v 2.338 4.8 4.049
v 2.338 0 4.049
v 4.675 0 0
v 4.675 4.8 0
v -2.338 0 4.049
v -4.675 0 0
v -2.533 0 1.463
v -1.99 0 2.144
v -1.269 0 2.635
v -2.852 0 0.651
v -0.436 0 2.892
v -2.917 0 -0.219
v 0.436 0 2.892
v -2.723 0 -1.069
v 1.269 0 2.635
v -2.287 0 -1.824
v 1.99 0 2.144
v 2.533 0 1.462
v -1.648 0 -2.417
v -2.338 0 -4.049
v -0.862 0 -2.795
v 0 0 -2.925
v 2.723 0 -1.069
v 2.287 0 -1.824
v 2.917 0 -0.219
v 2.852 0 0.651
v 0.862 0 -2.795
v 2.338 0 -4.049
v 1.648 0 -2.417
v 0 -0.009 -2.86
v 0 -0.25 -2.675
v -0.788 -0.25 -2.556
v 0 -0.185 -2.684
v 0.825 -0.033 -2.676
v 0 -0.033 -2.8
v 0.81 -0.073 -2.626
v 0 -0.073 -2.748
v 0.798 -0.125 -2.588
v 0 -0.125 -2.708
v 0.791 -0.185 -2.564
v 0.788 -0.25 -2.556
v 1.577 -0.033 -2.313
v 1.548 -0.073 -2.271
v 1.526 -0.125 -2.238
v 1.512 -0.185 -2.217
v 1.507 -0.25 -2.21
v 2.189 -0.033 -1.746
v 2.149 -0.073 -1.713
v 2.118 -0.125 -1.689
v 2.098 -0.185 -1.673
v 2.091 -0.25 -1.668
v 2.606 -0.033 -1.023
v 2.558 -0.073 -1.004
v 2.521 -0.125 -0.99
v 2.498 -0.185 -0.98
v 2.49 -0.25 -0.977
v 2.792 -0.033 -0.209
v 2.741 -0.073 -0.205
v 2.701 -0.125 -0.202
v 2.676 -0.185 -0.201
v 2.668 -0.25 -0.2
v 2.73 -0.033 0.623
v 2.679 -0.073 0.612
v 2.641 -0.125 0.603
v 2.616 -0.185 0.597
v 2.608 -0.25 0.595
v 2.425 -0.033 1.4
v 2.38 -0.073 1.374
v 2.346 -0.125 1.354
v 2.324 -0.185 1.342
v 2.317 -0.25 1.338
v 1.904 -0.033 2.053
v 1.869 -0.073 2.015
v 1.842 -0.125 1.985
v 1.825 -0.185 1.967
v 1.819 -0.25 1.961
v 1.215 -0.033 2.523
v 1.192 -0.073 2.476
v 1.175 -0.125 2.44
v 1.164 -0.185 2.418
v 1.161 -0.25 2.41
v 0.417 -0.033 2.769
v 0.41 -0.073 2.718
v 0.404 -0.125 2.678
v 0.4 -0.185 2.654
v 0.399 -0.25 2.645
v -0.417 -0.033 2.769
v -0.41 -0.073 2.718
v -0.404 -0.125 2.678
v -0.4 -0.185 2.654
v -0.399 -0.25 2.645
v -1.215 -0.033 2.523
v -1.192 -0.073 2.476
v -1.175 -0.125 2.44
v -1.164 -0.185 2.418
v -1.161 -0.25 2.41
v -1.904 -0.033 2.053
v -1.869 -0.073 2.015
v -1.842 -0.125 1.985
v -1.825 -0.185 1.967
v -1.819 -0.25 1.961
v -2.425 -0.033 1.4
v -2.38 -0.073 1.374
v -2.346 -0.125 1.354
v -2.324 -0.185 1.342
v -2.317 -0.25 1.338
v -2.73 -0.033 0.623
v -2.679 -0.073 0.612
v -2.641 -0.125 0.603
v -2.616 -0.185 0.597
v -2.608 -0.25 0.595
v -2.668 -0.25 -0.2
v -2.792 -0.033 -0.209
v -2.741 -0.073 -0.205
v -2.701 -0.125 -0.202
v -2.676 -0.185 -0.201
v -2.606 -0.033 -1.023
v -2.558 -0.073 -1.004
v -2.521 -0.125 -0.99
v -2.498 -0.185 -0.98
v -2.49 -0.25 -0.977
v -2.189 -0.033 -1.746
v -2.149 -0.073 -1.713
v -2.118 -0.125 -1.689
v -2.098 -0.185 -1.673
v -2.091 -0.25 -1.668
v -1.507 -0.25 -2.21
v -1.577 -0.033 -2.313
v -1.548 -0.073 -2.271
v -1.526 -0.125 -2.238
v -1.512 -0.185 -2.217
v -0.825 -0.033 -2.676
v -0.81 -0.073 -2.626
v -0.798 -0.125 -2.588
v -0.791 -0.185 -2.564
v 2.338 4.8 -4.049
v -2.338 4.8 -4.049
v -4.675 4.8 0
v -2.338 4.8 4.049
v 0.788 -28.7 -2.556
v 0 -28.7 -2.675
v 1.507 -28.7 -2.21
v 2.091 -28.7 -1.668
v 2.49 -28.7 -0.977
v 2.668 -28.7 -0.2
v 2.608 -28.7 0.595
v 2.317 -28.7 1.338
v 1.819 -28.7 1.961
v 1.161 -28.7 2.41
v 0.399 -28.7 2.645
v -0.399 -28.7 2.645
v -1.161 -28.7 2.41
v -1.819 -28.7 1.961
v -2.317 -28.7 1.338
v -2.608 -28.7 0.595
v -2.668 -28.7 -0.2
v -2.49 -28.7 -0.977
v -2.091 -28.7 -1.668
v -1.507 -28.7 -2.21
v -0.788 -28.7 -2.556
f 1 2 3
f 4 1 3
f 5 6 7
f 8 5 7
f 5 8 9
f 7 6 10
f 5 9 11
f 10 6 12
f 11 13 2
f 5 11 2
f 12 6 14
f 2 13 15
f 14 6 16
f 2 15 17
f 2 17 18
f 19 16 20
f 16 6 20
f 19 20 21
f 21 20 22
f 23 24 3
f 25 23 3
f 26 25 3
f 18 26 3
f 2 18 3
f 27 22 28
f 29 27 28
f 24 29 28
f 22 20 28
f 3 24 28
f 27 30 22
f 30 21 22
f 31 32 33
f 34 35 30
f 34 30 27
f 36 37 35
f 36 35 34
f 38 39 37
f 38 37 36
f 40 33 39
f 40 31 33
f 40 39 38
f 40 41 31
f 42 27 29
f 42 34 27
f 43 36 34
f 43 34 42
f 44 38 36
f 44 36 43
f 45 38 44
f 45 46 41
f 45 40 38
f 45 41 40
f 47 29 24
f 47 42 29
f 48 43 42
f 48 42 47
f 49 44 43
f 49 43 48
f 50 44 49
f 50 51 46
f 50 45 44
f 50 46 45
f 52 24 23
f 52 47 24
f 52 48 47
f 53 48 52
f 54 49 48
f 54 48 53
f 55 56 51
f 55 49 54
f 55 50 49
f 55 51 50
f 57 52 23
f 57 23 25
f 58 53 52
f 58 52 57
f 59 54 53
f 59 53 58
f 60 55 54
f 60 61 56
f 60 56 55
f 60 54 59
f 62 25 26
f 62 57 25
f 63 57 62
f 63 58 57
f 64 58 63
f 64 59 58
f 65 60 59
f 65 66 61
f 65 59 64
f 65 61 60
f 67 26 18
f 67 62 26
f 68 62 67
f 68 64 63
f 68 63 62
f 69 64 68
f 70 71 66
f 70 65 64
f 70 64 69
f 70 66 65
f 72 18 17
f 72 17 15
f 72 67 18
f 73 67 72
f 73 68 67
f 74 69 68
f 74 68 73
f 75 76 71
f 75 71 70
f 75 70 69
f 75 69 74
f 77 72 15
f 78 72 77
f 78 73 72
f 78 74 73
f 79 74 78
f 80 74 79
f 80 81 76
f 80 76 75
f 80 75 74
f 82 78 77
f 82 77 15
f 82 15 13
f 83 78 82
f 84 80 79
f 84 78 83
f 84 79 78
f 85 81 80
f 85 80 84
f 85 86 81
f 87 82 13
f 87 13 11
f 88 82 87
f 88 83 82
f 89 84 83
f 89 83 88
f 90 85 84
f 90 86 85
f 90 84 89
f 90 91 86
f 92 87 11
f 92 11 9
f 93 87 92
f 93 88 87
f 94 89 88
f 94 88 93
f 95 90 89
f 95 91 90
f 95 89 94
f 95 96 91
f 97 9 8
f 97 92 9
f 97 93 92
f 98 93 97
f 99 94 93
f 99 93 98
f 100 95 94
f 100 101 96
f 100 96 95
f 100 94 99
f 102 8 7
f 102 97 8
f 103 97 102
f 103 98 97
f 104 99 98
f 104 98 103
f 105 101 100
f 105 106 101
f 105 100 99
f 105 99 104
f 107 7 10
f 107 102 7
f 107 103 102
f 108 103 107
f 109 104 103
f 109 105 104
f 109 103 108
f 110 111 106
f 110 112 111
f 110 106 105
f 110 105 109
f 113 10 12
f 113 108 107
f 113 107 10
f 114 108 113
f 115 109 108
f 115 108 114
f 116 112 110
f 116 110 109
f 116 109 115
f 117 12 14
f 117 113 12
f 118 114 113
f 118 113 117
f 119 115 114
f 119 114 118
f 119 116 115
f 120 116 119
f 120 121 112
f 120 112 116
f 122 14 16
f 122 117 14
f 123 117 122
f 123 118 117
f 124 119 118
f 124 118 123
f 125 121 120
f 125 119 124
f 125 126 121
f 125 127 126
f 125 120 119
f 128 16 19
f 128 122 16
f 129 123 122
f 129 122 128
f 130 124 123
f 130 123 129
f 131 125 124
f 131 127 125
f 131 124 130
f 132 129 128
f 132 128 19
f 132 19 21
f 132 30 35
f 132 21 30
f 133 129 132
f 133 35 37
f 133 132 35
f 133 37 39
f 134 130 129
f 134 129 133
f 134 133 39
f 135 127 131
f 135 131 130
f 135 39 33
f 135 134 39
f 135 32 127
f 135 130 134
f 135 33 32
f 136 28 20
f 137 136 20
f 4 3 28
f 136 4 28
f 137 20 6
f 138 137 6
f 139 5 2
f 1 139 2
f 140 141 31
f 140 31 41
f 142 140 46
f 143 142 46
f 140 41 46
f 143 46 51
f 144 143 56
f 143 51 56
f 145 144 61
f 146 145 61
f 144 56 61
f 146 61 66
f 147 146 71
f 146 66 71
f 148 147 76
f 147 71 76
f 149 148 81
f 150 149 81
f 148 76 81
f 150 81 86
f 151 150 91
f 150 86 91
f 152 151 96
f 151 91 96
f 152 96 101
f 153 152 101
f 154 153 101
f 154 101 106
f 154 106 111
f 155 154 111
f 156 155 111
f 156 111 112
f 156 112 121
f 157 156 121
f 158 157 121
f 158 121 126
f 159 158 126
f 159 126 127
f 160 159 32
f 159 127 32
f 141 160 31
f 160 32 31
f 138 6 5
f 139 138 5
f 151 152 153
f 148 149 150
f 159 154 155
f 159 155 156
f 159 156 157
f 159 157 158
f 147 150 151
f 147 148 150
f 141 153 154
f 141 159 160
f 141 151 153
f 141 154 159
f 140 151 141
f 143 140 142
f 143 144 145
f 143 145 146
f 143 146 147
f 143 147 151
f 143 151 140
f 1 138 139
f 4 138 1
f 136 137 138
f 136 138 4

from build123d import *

# Parameters (mm, degrees)
BOSS_EXTRUDE1_DEPTH = 4.8
SKETCH3_R           = 2.675
BOSS_EXTRUDE2_DEPTH = 28.7
FILLET1_R           = 0.25


with BuildPart() as part:
    # Sketch2 → Boss-Extrude1 (new body)
    with BuildSketch(Plane(origin=(0, 0, 0), x_dir=(1, 0, 0), z_dir=(0, 1, 0))):
        Polygon((-2.3375, 4.048668763), (-4.675, 0), (-2.3375, -4.048668763), (2.3375, -4.048668763), (4.675, 0), (2.3375, 4.048668763), align=None)
    extrude(amount=BOSS_EXTRUDE1_DEPTH)

    # Sketch3 → Boss-Extrude2 (add)
    with BuildSketch(Plane.XZ):
        with Locations(Location((0, 0, 0), (0, 0, 270))):
            Circle(SKETCH3_R)
    extrude(amount=BOSS_EXTRUDE2_DEPTH)

    # Fillet1
    fillet1_edges = [part.edges().sort_by_distance(p)[0] for p in [
        (0, 0, 2.675),
    ]]
    fillet(fillet1_edges, radius=FILLET1_R)


solid = part.part
